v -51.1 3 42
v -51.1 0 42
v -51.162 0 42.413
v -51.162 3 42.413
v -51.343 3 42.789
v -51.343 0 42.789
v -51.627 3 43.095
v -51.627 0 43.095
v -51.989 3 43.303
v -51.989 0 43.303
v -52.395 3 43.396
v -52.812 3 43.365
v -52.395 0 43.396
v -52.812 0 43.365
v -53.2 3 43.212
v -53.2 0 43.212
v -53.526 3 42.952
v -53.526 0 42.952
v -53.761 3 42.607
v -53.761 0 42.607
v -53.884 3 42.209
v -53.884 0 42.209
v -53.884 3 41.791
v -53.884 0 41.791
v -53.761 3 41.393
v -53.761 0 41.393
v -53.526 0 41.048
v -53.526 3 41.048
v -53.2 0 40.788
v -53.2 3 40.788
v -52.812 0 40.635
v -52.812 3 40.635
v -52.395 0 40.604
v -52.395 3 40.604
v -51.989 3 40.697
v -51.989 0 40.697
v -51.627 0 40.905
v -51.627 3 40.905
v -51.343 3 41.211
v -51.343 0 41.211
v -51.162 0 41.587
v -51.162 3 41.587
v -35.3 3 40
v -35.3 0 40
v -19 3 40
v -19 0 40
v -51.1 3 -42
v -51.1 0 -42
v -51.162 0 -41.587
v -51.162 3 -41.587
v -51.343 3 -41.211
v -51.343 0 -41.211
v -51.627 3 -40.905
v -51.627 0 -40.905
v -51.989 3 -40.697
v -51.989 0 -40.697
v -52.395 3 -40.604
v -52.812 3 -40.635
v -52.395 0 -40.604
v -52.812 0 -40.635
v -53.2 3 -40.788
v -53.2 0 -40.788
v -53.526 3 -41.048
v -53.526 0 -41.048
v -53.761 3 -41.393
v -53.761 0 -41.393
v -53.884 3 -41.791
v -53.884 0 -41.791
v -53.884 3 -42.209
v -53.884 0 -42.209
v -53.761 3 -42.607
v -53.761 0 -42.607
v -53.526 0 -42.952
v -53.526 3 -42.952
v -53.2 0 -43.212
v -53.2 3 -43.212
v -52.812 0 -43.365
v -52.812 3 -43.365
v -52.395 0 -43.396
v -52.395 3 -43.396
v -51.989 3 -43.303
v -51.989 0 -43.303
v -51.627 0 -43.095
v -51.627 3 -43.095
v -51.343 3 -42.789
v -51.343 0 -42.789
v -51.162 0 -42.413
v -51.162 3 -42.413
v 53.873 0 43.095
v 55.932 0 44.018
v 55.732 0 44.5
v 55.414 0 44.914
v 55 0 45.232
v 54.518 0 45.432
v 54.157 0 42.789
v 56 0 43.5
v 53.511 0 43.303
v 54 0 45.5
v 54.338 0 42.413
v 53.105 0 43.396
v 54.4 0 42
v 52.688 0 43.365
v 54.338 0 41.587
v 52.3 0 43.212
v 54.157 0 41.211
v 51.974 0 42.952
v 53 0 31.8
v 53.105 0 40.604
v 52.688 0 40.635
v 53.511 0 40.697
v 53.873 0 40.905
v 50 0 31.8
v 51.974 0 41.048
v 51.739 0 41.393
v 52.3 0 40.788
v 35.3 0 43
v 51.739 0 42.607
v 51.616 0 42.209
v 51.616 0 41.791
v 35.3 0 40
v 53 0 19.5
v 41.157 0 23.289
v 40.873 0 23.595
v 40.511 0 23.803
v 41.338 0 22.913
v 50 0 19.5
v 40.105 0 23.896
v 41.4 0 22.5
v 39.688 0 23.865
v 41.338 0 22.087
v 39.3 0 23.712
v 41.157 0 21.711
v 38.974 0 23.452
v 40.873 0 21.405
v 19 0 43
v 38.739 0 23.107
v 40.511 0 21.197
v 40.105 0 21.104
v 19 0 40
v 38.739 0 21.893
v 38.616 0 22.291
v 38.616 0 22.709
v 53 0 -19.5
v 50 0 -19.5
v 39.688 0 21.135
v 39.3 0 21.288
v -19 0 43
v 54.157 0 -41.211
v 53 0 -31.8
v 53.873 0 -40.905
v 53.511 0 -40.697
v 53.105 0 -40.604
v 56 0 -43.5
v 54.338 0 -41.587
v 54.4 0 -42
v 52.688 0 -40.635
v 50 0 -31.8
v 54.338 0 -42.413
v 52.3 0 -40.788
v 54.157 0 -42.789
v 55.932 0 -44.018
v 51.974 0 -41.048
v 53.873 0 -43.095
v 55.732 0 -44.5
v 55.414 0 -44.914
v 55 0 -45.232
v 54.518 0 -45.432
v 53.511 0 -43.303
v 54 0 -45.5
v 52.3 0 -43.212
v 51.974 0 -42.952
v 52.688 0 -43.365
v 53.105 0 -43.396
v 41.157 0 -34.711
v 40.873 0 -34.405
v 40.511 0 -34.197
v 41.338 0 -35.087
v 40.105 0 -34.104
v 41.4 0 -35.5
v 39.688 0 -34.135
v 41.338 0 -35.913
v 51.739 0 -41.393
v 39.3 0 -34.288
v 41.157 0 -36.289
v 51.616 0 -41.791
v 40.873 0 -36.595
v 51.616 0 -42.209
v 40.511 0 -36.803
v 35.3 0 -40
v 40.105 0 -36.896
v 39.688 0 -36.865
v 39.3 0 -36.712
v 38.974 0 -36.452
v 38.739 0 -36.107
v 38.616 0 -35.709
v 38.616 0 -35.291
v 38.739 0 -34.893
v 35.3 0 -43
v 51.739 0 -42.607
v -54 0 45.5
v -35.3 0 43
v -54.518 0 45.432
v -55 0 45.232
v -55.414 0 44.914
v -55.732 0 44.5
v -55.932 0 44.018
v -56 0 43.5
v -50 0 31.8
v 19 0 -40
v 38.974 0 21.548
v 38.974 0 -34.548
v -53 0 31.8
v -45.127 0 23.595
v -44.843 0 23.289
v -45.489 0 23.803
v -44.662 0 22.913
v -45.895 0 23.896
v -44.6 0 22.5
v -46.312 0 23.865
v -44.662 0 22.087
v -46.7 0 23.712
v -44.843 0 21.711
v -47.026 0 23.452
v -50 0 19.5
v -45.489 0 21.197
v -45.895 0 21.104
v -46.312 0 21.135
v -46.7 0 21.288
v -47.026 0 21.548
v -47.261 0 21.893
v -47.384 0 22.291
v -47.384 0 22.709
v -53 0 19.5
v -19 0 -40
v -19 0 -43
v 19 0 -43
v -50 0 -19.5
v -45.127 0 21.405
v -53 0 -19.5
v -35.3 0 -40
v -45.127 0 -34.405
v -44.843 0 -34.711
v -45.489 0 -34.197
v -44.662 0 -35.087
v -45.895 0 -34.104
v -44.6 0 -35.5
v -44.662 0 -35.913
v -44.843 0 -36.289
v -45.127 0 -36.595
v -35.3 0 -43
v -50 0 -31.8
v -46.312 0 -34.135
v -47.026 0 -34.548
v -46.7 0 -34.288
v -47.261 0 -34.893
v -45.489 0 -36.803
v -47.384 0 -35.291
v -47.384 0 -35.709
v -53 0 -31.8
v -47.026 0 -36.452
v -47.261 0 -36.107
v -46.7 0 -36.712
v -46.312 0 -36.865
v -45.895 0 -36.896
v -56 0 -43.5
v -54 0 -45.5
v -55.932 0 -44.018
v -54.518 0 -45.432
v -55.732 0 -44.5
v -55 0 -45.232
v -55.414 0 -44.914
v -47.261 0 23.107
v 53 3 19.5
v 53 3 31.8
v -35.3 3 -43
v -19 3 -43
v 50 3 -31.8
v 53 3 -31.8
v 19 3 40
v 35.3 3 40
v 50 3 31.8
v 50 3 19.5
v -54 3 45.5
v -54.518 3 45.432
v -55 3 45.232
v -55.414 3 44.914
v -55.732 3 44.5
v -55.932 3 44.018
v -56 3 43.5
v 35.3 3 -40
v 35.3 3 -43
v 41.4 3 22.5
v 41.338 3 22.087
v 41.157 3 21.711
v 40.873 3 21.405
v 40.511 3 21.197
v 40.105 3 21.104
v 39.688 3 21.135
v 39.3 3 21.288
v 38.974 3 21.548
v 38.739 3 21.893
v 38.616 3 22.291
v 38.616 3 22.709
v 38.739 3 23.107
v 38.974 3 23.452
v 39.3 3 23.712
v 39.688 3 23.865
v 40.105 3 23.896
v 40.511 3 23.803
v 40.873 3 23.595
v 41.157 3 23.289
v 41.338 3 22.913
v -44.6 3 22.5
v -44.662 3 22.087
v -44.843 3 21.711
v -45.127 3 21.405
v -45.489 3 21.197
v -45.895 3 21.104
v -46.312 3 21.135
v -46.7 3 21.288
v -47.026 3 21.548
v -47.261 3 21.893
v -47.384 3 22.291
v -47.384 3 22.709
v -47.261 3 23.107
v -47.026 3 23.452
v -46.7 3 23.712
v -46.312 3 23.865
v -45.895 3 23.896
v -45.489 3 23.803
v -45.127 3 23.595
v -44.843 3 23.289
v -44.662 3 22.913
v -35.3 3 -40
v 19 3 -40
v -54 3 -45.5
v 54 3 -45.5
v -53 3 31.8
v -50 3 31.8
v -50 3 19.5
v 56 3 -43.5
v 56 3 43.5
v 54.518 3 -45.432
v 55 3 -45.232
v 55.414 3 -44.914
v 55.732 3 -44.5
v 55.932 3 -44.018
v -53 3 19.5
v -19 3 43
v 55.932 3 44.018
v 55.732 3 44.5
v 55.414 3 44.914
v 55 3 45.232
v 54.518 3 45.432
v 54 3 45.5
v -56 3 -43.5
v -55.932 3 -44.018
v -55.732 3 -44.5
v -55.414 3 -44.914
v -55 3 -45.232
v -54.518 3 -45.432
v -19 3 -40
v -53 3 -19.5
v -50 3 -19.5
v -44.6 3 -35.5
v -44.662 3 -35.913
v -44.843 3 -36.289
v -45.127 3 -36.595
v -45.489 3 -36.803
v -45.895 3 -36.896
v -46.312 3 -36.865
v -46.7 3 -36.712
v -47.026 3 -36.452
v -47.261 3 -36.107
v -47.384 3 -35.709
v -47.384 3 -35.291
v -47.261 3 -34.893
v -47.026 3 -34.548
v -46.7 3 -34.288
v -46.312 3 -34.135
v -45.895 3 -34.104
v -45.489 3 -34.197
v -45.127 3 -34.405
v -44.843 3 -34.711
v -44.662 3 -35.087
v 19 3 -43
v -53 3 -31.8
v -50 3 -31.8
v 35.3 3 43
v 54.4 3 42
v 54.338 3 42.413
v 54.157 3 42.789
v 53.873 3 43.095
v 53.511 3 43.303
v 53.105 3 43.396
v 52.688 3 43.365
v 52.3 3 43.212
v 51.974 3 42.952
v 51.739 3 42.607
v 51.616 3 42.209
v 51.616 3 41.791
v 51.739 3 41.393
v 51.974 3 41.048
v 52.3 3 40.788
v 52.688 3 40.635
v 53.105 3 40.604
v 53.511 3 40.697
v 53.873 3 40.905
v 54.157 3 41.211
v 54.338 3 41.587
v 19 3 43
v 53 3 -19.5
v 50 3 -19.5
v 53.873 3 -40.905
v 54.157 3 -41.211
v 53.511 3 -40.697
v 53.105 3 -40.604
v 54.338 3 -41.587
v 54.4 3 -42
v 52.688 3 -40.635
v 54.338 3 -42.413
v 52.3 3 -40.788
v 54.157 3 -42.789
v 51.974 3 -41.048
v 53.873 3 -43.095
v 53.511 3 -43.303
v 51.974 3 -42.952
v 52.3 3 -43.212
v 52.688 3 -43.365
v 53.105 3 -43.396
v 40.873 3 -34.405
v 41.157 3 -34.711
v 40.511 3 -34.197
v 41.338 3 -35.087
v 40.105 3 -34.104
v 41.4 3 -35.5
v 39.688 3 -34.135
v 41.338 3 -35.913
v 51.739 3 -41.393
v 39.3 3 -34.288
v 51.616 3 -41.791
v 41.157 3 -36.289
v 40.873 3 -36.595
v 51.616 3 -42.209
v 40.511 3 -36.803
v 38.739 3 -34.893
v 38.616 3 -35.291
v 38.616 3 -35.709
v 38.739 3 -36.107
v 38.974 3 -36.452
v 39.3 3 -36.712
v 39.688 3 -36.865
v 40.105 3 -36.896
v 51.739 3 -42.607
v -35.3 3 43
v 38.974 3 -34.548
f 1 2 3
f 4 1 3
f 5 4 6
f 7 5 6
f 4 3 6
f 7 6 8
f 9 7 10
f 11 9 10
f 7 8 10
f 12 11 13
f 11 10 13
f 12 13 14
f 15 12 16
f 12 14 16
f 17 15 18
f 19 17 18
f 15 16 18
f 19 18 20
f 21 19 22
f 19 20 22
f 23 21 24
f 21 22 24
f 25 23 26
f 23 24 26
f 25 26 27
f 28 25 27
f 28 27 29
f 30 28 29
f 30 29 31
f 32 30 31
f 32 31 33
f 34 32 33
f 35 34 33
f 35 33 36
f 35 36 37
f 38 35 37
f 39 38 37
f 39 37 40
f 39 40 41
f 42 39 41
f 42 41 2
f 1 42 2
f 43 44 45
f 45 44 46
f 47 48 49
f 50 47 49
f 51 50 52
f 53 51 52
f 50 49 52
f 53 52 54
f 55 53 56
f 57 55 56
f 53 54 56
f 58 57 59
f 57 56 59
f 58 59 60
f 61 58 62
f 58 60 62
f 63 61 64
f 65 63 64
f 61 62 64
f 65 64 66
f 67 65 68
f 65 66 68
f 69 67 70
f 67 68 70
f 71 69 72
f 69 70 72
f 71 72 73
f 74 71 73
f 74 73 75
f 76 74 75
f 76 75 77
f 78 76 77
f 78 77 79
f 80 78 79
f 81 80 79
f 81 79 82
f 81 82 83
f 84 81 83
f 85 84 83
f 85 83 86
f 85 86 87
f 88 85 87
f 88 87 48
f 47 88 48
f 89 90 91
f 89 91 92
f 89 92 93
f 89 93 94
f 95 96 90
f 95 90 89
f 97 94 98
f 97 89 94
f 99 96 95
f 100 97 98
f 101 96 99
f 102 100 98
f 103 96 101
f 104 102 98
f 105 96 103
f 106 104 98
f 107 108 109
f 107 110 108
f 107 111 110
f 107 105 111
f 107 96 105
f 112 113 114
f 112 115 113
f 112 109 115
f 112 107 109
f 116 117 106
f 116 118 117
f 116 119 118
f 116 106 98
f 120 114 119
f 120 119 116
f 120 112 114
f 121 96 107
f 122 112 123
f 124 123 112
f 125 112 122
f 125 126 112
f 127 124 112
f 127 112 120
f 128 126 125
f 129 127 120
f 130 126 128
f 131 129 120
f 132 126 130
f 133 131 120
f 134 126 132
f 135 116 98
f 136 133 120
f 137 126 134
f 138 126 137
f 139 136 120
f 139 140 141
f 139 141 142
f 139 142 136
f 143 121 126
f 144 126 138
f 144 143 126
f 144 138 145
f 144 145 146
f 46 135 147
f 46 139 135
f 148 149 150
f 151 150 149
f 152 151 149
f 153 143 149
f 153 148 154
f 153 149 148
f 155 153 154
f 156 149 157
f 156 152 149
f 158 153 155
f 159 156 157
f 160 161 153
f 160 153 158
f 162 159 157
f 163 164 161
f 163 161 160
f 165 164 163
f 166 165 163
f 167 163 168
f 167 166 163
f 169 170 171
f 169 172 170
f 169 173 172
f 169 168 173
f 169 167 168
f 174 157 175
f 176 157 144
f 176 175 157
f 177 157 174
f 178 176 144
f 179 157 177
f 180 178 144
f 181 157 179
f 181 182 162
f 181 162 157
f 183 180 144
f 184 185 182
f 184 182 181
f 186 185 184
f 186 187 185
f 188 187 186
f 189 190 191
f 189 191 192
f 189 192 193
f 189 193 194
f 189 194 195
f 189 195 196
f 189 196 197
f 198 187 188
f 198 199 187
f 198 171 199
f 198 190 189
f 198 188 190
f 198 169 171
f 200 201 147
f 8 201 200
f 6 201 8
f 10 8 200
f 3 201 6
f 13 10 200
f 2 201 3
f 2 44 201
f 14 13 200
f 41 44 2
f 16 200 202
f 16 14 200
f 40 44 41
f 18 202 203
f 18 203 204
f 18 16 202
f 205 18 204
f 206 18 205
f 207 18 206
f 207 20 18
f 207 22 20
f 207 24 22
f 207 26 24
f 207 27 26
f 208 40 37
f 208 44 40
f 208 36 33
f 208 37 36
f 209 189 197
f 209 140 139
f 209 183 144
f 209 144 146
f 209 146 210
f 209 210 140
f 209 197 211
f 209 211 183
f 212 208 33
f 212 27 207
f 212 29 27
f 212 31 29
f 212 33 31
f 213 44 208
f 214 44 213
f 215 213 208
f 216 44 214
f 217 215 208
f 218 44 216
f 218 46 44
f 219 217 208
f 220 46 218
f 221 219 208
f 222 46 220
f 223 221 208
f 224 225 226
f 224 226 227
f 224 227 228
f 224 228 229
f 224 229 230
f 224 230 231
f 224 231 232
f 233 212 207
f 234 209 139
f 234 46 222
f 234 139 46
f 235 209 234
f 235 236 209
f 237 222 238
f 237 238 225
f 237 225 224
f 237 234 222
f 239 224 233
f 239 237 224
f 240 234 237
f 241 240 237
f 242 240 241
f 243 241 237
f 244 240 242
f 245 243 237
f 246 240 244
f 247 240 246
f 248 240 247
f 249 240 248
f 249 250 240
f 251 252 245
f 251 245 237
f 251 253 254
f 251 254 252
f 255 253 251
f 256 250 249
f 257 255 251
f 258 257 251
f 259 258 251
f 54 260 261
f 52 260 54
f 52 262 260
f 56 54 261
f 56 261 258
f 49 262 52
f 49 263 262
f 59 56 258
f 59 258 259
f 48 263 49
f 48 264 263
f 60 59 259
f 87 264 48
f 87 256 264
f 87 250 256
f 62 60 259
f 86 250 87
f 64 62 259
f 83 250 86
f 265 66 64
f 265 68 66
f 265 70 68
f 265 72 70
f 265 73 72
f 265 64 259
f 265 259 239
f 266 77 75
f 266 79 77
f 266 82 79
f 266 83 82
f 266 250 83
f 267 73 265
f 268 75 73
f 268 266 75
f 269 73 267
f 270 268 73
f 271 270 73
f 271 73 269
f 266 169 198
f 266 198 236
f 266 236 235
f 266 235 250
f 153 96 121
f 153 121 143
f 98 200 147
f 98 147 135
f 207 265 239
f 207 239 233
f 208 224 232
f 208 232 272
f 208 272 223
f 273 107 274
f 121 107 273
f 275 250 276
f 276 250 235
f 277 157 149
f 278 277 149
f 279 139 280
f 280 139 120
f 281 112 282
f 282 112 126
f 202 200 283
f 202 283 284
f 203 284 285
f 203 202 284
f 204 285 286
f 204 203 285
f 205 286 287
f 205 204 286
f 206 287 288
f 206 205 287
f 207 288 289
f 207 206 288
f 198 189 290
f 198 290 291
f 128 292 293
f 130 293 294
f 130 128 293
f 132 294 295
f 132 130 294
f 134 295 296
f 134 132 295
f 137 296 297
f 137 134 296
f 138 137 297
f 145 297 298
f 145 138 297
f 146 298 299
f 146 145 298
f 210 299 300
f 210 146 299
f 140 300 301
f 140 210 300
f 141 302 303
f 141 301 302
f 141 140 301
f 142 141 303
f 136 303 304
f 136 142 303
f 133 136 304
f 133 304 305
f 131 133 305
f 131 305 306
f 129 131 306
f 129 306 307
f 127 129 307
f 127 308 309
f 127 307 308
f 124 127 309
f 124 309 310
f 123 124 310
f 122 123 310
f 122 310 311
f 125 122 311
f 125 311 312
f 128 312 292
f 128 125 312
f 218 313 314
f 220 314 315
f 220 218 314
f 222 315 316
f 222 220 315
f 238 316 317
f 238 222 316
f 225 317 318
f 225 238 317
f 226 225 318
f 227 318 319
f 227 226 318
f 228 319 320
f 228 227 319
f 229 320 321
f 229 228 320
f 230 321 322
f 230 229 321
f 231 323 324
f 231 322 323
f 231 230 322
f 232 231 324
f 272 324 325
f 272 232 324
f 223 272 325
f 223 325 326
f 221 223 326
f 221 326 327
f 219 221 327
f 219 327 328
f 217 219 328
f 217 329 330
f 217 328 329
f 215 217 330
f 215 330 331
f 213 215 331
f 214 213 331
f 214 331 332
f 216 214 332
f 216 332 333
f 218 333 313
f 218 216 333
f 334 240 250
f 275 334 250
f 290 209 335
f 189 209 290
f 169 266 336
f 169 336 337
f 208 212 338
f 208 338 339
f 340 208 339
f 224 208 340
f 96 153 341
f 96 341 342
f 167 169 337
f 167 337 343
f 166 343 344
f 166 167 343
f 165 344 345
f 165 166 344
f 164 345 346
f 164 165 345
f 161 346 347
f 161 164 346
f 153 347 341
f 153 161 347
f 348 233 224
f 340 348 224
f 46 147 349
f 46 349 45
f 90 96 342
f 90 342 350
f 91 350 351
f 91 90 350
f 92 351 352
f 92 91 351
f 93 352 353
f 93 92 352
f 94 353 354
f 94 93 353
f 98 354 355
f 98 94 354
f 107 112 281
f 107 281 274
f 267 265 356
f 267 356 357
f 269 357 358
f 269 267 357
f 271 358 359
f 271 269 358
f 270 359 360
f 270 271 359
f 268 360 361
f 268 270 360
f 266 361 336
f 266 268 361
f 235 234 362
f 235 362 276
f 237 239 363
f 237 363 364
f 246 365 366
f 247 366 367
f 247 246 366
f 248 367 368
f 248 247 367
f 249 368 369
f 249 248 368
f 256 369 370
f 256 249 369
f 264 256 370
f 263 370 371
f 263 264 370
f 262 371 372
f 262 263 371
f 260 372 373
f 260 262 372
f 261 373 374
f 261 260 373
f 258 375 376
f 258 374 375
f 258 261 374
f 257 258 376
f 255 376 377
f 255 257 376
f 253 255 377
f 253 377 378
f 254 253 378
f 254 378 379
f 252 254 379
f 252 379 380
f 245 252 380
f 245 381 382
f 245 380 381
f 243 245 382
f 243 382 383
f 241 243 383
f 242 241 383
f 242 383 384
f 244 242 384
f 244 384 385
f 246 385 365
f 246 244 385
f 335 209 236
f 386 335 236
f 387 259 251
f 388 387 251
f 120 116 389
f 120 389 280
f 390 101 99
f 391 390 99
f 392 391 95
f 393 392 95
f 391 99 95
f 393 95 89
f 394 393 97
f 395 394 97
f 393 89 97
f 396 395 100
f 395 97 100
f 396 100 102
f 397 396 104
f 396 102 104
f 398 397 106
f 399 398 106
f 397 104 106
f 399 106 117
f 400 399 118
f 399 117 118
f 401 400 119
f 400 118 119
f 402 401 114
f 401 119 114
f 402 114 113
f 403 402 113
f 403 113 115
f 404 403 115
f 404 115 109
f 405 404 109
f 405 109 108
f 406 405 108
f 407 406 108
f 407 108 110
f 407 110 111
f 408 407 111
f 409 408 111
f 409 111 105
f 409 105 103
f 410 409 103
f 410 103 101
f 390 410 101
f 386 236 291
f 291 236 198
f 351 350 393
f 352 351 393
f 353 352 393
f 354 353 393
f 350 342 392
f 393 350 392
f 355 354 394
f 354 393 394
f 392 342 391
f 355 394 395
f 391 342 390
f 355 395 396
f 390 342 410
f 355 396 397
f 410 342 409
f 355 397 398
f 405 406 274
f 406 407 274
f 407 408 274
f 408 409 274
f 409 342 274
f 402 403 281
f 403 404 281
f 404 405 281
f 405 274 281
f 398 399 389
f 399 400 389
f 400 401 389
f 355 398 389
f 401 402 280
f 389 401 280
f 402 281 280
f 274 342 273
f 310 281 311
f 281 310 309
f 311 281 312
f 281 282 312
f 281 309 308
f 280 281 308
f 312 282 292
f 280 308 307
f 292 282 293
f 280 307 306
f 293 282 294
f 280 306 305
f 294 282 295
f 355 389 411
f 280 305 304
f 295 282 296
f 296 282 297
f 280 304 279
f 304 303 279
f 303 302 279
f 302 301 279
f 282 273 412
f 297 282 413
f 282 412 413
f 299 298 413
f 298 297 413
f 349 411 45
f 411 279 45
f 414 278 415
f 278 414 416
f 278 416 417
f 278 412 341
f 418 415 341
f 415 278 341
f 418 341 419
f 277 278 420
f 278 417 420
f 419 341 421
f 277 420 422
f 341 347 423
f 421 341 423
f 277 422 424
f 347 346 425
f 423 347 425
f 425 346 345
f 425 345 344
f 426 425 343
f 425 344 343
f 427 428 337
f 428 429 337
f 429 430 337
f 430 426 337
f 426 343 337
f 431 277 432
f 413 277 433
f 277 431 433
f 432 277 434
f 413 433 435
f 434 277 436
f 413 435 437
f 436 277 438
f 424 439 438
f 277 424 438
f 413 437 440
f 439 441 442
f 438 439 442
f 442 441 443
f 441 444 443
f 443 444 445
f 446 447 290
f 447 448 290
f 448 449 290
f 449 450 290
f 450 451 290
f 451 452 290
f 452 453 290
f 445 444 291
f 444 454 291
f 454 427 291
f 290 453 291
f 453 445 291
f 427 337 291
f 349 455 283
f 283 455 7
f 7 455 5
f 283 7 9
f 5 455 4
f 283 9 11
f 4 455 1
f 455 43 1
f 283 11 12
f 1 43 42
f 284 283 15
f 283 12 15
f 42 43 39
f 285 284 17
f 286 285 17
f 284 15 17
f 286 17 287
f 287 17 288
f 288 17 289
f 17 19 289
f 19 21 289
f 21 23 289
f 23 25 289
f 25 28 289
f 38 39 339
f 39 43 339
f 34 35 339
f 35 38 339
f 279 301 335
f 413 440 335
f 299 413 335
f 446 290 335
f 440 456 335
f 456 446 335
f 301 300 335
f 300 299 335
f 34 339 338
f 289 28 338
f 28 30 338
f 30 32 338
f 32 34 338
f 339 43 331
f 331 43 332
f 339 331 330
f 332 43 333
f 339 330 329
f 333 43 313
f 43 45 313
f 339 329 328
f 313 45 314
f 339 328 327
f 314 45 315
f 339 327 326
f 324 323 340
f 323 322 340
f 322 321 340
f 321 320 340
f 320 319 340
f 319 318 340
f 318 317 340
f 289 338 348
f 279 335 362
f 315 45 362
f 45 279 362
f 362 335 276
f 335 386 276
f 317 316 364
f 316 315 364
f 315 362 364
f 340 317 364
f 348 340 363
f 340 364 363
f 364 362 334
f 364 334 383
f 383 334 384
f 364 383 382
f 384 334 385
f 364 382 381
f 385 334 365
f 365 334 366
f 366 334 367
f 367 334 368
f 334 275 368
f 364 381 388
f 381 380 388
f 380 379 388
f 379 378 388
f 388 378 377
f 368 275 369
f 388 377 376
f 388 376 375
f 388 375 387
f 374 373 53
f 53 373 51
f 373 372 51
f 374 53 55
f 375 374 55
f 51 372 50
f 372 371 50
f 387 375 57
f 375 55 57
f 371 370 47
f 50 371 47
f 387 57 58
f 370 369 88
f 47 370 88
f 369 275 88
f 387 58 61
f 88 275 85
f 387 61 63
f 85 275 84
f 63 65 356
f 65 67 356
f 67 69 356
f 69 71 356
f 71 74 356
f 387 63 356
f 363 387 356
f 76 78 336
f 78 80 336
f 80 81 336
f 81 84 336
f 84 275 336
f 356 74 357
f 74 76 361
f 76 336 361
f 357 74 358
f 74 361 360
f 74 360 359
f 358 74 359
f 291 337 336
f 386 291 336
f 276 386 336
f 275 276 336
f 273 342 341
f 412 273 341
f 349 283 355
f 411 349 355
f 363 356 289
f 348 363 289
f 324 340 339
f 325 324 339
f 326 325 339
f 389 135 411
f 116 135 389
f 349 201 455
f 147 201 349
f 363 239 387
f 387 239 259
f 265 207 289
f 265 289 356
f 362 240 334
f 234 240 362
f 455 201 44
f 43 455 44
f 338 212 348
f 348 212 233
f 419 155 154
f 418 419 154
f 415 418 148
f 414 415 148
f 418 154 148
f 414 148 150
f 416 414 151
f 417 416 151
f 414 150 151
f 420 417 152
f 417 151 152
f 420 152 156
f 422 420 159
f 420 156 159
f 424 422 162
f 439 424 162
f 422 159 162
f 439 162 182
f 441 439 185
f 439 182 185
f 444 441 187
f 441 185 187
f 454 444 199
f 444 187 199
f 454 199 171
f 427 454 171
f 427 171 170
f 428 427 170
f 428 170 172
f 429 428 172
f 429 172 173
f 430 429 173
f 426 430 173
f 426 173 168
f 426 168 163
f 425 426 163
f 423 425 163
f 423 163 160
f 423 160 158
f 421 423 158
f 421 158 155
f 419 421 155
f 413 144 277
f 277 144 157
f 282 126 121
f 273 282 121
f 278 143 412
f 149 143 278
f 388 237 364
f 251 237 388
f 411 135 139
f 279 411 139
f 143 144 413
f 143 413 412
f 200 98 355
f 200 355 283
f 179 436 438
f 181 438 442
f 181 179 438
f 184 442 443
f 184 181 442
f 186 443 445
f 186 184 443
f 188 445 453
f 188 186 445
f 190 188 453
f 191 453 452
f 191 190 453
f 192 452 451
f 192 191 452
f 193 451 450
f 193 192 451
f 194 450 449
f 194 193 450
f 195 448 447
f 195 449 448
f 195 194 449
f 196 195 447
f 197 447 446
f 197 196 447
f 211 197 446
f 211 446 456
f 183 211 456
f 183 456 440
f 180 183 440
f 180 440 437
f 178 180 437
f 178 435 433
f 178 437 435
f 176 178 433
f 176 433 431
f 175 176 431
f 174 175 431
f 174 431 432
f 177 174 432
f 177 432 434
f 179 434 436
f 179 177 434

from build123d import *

# Parameters (mm, degrees)
CROQUIS1_W              = 16.3
CROQUIS1_H              = 3
CROQUIS1_W_2            = 3
CROQUIS1_H_2            = 12.3
SALIENTE_EXTRUIR1_DEPTH = 3
CORTAR_EXTRUIR1_REACH   = 5
CROQUIS2_R              = 1.4
CORTAR_EXTRUIR2_REACH   = 5
CROQUIS3_R              = 1.4


with BuildPart() as part:
    # Croquis1 → Saliente-Extruir1 (new body)
    with BuildSketch(Plane(origin=(0, 0, 0), x_dir=(1, 0, 0), z_dir=(0, 1, 0))):
        with BuildLine():
            Line((-54, 45.5), (54, 45.5))
            ThreePointArc((54, 45.5), (55.414213562, 44.914213562), (56, 43.5))
            Line((56, 43.5), (56, -43.5))
            ThreePointArc((56, -43.5), (55.414213562, -44.914213562), (54, -45.5))
            Line((54, -45.5), (-54, -45.5))
            ThreePointArc((-54, -45.5), (-55.414213562, -44.914213562), (-56, -43.5))
            Line((-56, -43.5), (-56, 43.5))
            ThreePointArc((-56, 43.5), (-55.414213562, 44.914213562), (-54, 45.5))
        make_face()
        with Locations((-27.15, 41.5)):
            Rectangle(CROQUIS1_W, CROQUIS1_H, mode=Mode.SUBTRACT)
        with Locations((27.15, 41.5)):
            Rectangle(CROQUIS1_W, CROQUIS1_H, mode=Mode.SUBTRACT)
        with Locations((-27.15, -41.5)):
            Rectangle(CROQUIS1_W, CROQUIS1_H, mode=Mode.SUBTRACT)
        with Locations((27.15, -41.5)):
            Rectangle(CROQUIS1_W, CROQUIS1_H, mode=Mode.SUBTRACT)
        with Locations((51.5, 25.65)):
            Rectangle(CROQUIS1_W_2, CROQUIS1_H_2, mode=Mode.SUBTRACT)
        with Locations((51.5, -25.65)):
            Rectangle(CROQUIS1_W_2, CROQUIS1_H_2, mode=Mode.SUBTRACT)
        with Locations((-51.5, 25.65)):
            Rectangle(CROQUIS1_W_2, CROQUIS1_H_2, mode=Mode.SUBTRACT)
        with Locations((-51.5, -25.65)):
            Rectangle(CROQUIS1_W_2, CROQUIS1_H_2, mode=Mode.SUBTRACT)
    extrude(amount=SALIENTE_EXTRUIR1_DEPTH)

    # Croquis2 → Cortar-Extruir1 (cut, up to next)
    with BuildSketch(Plane.XZ, mode=Mode.PRIVATE) as cortar_extruir1_sk1:
        with Locations((53, -42)):
            Circle(CROQUIS2_R)
    cortar_extruir1_tool1 = extrude(cortar_extruir1_sk1.sketch, amount=-CORTAR_EXTRUIR1_REACH, mode=Mode.PRIVATE) & part.part
    add(cortar_extruir1_tool1.solids().sort_by_distance((53, 0, -42))[0], mode=Mode.SUBTRACT)
    # Croquis2 → Cortar-Extruir1 (cut, up to next)
    with BuildSketch(Plane.XZ, mode=Mode.PRIVATE) as cortar_extruir1_sk2:
        with Locations((-52.5, -42)):
            Circle(CROQUIS2_R)
    cortar_extruir1_tool2 = extrude(cortar_extruir1_sk2.sketch, amount=-CORTAR_EXTRUIR1_REACH, mode=Mode.PRIVATE) & part.part
    add(cortar_extruir1_tool2.solids().sort_by_distance((-52.5, 0, -42))[0], mode=Mode.SUBTRACT)
    # Croquis2 → Cortar-Extruir1 (cut, up to next)
    with BuildSketch(Plane.XZ, mode=Mode.PRIVATE) as cortar_extruir1_sk3:
        with Locations((-52.5, 42)):
            Circle(CROQUIS2_R)
    cortar_extruir1_tool3 = extrude(cortar_extruir1_sk3.sketch, amount=-CORTAR_EXTRUIR1_REACH, mode=Mode.PRIVATE) & part.part
    add(cortar_extruir1_tool3.solids().sort_by_distance((-52.5, 0, 42))[0], mode=Mode.SUBTRACT)
    # Croquis2 → Cortar-Extruir1 (cut, up to next)
    with BuildSketch(Plane.XZ, mode=Mode.PRIVATE) as cortar_extruir1_sk4:
        with Locations((53, 42)):
            Circle(CROQUIS2_R)
    cortar_extruir1_tool4 = extrude(cortar_extruir1_sk4.sketch, amount=-CORTAR_EXTRUIR1_REACH, mode=Mode.PRIVATE) & part.part
    add(cortar_extruir1_tool4.solids().sort_by_distance((53, 0, 42))[0], mode=Mode.SUBTRACT)

    # Croquis3 → Cortar-Extruir2 (cut, up to next)
    with BuildSketch(Plane(origin=(0, 0, 0), x_dir=(1, 0, 0), z_dir=(0, 1, 0)), mode=Mode.PRIVATE) as cortar_extruir2_sk1:
        with Locations((40, -22.5)):
            Circle(CROQUIS3_R)
    cortar_extruir2_tool1 = extrude(cortar_extruir2_sk1.sketch, amount=CORTAR_EXTRUIR2_REACH, mode=Mode.PRIVATE) & part.part
    add(cortar_extruir2_tool1.solids().sort_by_distance((40, 0, 22.5))[0], mode=Mode.SUBTRACT)
    # Croquis3 → Cortar-Extruir2 (cut, up to next)
    with BuildSketch(Plane(origin=(0, 0, 0), x_dir=(1, 0, 0), z_dir=(0, 1, 0)), mode=Mode.PRIVATE) as cortar_extruir2_sk2:
        with Locations((40, 35.5)):
            Circle(CROQUIS3_R)
    cortar_extruir2_tool2 = extrude(cortar_extruir2_sk2.sketch, amount=CORTAR_EXTRUIR2_REACH, mode=Mode.PRIVATE) & part.part
    add(cortar_extruir2_tool2.solids().sort_by_distance((40, 0, -35.5))[0], mode=Mode.SUBTRACT)
    # Croquis3 → Cortar-Extruir2 (cut, up to next)
    with BuildSketch(Plane(origin=(0, 0, 0), x_dir=(1, 0, 0), z_dir=(0, 1, 0)), mode=Mode.PRIVATE) as cortar_extruir2_sk3:
        with Locations((-46, 35.5)):
            Circle(CROQUIS3_R)
    cortar_extruir2_tool3 = extrude(cortar_extruir2_sk3.sketch, amount=CORTAR_EXTRUIR2_REACH, mode=Mode.PRIVATE) & part.part
    add(cortar_extruir2_tool3.solids().sort_by_distance((-46, 0, -35.5))[0], mode=Mode.SUBTRACT)
    # Croquis3 → Cortar-Extruir2 (cut, up to next)
    with BuildSketch(Plane(origin=(0, 0, 0), x_dir=(1, 0, 0), z_dir=(0, 1, 0)), mode=Mode.PRIVATE) as cortar_extruir2_sk4:
        with Locations((-46, -22.5)):
            Circle(CROQUIS3_R)
    cortar_extruir2_tool4 = extrude(cortar_extruir2_sk4.sketch, amount=CORTAR_EXTRUIR2_REACH, mode=Mode.PRIVATE) & part.part
    add(cortar_extruir2_tool4.solids().sort_by_distance((-46, 0, 22.5))[0], mode=Mode.SUBTRACT)


solid = part.part
